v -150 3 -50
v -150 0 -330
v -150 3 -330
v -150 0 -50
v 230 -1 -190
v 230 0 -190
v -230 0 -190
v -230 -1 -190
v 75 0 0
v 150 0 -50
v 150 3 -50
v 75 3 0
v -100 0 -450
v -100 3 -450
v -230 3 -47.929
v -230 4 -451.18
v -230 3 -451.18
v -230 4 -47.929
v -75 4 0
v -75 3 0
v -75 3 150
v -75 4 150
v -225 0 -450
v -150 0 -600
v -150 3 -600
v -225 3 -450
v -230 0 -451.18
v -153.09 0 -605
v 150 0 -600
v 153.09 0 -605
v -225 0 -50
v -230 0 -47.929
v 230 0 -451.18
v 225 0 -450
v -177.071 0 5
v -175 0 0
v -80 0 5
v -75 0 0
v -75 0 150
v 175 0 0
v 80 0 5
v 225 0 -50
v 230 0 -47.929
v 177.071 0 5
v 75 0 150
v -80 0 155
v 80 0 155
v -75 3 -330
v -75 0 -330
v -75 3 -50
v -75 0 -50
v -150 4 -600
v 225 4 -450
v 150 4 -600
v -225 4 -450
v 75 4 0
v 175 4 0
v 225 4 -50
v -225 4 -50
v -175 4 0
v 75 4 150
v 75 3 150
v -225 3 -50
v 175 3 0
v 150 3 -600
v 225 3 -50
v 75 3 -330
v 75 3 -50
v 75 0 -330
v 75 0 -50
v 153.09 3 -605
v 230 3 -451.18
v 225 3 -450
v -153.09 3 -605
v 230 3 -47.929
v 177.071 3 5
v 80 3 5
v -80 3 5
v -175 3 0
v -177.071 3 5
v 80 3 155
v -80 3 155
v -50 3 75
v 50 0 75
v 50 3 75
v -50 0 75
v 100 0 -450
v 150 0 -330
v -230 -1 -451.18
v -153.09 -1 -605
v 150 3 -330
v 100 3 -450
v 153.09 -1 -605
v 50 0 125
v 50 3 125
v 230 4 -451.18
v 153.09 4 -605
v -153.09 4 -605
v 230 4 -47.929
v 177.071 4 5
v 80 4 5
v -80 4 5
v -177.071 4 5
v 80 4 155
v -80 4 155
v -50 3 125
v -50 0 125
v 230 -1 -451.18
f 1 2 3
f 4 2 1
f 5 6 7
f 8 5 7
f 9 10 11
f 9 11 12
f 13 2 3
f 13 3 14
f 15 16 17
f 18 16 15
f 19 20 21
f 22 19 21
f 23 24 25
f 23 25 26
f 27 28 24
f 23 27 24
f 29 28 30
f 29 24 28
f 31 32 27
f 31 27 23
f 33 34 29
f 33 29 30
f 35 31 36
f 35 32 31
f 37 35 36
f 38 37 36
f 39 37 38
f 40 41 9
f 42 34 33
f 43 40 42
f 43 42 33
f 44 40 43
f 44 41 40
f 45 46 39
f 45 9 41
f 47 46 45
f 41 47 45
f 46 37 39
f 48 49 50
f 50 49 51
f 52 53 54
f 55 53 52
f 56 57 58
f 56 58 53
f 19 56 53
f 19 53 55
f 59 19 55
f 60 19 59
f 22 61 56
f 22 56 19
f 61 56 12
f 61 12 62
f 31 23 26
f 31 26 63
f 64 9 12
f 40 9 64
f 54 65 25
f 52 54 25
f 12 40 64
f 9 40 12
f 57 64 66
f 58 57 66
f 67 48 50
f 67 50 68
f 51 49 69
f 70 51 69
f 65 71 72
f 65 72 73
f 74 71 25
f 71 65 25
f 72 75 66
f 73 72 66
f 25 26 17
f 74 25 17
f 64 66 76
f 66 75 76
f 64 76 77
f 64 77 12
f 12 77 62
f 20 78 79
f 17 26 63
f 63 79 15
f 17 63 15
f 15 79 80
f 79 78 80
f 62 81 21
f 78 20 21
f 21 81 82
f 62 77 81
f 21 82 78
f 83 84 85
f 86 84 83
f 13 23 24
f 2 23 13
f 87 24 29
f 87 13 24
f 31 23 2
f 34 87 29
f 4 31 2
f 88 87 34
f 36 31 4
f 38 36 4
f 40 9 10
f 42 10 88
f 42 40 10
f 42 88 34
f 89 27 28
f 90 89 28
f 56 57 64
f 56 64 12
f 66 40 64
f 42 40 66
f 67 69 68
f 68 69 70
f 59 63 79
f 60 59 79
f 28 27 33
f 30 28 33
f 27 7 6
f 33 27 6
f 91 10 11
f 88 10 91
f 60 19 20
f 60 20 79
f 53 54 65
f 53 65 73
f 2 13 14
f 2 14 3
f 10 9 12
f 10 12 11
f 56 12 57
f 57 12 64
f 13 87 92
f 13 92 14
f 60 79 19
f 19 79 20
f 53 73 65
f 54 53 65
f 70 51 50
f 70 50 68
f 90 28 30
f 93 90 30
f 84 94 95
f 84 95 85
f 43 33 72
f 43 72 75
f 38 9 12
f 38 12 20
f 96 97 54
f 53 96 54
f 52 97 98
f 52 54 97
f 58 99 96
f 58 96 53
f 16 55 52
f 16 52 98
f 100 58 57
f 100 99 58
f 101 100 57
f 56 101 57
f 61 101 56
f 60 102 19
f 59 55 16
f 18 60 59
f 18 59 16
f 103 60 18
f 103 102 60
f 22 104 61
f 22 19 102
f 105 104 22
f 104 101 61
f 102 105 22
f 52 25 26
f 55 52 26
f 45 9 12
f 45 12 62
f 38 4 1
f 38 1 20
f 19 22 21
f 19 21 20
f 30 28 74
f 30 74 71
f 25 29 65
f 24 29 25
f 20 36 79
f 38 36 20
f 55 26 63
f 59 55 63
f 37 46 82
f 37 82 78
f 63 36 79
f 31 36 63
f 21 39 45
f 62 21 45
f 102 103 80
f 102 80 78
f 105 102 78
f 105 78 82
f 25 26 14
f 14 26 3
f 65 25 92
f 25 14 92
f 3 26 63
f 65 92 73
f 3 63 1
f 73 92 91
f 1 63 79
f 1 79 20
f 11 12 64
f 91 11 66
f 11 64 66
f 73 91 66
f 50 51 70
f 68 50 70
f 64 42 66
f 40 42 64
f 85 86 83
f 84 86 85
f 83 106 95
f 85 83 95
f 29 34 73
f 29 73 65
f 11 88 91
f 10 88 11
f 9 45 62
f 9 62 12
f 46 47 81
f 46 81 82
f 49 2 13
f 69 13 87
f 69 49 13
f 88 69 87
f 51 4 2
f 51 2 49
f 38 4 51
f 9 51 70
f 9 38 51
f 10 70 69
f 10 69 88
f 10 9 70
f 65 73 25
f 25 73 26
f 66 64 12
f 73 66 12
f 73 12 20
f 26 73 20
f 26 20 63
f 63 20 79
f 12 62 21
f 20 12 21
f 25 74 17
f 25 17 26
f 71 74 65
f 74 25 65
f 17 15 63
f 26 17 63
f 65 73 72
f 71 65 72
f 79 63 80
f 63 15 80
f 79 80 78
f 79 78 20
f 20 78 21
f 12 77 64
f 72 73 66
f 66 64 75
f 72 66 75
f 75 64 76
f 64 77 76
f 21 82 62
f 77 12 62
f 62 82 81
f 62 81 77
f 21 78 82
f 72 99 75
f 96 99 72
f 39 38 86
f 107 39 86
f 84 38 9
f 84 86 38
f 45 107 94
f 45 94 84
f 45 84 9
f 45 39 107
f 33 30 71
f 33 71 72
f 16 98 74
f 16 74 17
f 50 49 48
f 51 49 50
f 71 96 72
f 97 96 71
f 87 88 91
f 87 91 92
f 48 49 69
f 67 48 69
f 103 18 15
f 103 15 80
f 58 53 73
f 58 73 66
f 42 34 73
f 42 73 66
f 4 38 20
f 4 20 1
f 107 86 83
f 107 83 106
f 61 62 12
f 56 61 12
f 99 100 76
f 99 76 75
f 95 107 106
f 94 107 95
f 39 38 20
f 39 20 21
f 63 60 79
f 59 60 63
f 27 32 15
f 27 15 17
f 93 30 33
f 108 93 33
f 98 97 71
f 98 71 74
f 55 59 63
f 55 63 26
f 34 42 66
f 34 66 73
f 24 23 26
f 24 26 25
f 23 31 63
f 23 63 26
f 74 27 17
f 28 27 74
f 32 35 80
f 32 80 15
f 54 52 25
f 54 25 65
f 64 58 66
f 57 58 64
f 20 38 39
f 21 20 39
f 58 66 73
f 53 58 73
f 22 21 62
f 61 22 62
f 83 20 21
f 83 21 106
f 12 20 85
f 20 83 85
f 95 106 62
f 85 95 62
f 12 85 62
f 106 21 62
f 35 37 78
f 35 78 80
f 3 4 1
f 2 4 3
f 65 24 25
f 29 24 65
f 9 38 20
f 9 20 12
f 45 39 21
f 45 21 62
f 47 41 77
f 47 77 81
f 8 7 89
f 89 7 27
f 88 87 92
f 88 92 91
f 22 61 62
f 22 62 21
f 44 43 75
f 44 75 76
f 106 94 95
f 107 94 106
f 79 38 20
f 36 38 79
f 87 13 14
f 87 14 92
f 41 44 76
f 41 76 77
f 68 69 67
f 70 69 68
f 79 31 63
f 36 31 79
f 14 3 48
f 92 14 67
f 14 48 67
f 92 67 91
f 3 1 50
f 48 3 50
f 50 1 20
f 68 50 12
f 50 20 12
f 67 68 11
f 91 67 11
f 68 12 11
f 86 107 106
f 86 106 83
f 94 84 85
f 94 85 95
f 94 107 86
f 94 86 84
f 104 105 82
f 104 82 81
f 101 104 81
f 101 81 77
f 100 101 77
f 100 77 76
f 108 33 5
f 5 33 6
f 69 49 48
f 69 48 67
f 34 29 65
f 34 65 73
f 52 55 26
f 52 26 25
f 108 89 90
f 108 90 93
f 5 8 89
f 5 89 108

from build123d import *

# Parameters (mm, degrees)
F1_DEPTH  = 3
F2_W      = 150
F2_H      = 150
F3_DEPTH  = 3
F4_W      = 150
F4_H      = 280
F5_DEPTH  = 3
F6_W      = 150
F6_H      = 280
F7_DEPTH  = 3
F9_DEPTH  = 3
F11_DEPTH = 3
F13_DEPTH = 1
F15_DEPTH = 1
F17_DEPTH = 1


with BuildPart() as f1:
    # F0 (on Front) → F1 (new body)
    with BuildSketch(Plane.XZ):
        Polygon((50, 125), (0, 125), (-50, 125), (-50, 100), (-50, 75), (0, 75), (50, 75), (50, 100), align=None)
    extrude(amount=-F1_DEPTH)


with BuildPart() as f3:
    # F2 (on Front) → F3 (new body)
    with BuildSketch(Plane.XZ):
        with Locations((0, 75)):
            Rectangle(F2_W, F2_H)
        Polygon((-50, 125), (0, 125), (50, 125), (50, 100), (50, 75), (0, 75), (-50, 75), (-50, 100), align=None, mode=Mode.SUBTRACT)
    extrude(amount=-F3_DEPTH)


with BuildPart() as f5:
    # F4 (on Front) → F5 (new body)
    with BuildSketch(Plane.XZ):
        with Locations((0, -190)):
            Rectangle(F4_W, F4_H)
    extrude(amount=-F5_DEPTH)


with BuildPart() as f7:
    # F6 (on Front) → F7 (new body)
    with BuildSketch(Plane.XZ):
        Polygon((75, 0), (-75, 0), (-150, -50), (-150, -330), (-100, -450), (100, -450), (150, -330), (150, -50), align=None)
        with Locations((0, -190)):
            Rectangle(F6_W, F6_H, mode=Mode.SUBTRACT)
    extrude(amount=-F7_DEPTH)


with BuildPart() as f9:
    # F8 (on face) → F9 (new body)
    with BuildSketch(Plane.XZ):
        Polygon((175, 0), (75, 0), (150, -50), (150, -330), (100, -450), (-100, -450), (-150, -330), (-150, -50), (-75, 0), (-175, 0), (-225, -50), (-225, -450), (-150, -600), (150, -600), (225, -450), (225, -50), align=None)
    extrude(amount=-F9_DEPTH)


with BuildPart() as f11:
    # F10 (on face) → F11 (new body)
    with BuildSketch(Plane.XZ):
        Polygon((230, -47.928932), (177.071068, 5), (80, 5), (80, 155), (-80, 155), (-80, 5), (-177.071068, 5), (-230, -47.928932), (-230, -451.18034), (-153.09017, -605), (153.09017, -605), (230, -451.18034), align=None)
        Polygon((-75, 150), (75, 150), (75, 0), (175, 0), (225, -50), (225, -450), (150, -600), (-150, -600), (-225, -450), (-225, -50), (-175, 0), (-75, 0), align=None, mode=Mode.SUBTRACT)
    extrude(amount=-F11_DEPTH)


with BuildPart() as f13:
    # F12 (on face) → F13 (new body)
    with BuildSketch(Plane(origin=(0, 3, 0), x_dir=(-1, 0, 0), z_dir=(0, 1, 0))):
        Polygon((75, 0), (75, 150), (-75, 150), (-75, 0), (-175, 0), (-225, -50), (-225, -450), (-150, -600), (150, -600), (225, -450), (225, -50), (175, 0), align=None)
    extrude(amount=F13_DEPTH)


with BuildPart() as f15:
    # F14 (on face) → F15 (new body)
    with BuildSketch(Plane(origin=(0, 4, 0), x_dir=(-1, 0, 0), z_dir=(0, 1, 0))):
        Polygon((80, 155), (-80, 155), (-80, 5), (-177.071068, 5), (-230, -47.928932), (-230, -451.18034), (-153.09017, -605), (153.09017, -605), (230, -451.18034), (230, -47.928932), (177.071068, 5), (80, 5), align=None)
        Polygon((-75, 0), (-75, 150), (75, 150), (75, 0), (175, 0), (225, -50), (225, -450), (150, -600), (-150, -600), (-225, -450), (-225, -50), (-175, 0), align=None, mode=Mode.SUBTRACT)
    extrude(amount=-F15_DEPTH)


with BuildPart() as f17:
    # F16 (on face) → F17 (new body)
    with BuildSketch(Plane.XZ):
        Polygon((-230, -451.18034), (-153.09017, -605), (153.09017, -605), (230, -451.18034), (230, -190), (-230, -190), align=None)
    extrude(amount=F17_DEPTH)


solid = Compound([f1.part, f3.part, f5.part, f7.part, f9.part, f11.part, f13.part, f15.part, f17.part])
